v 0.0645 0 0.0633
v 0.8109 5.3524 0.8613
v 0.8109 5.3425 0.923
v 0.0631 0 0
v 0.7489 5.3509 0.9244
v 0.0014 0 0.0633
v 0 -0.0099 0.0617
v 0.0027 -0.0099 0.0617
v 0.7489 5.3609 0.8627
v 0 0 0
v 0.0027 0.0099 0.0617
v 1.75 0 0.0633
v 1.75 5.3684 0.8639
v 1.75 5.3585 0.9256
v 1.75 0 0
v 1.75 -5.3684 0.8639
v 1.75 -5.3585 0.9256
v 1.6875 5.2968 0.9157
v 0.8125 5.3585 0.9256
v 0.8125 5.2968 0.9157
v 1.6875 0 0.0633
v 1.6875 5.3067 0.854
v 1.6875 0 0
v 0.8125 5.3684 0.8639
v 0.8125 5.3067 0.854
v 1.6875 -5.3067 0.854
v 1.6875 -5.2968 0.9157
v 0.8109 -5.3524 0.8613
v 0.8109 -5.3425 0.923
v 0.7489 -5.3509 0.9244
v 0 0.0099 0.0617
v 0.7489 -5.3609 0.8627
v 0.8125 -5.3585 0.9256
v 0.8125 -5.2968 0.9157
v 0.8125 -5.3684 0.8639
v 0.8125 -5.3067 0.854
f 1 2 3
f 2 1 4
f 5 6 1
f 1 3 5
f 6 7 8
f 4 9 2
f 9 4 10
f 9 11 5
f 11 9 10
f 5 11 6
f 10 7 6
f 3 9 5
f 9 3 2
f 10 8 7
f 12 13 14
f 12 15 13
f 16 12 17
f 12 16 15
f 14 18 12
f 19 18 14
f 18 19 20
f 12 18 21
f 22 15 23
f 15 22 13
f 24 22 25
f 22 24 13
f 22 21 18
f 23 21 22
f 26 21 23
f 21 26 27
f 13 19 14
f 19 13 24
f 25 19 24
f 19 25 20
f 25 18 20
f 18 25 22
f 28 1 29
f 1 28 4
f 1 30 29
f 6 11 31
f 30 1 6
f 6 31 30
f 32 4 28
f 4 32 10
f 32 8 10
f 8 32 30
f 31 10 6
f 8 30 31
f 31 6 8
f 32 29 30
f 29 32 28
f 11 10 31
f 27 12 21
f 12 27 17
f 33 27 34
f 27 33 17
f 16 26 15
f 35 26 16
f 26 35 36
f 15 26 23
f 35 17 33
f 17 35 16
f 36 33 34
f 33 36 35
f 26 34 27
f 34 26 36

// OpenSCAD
// file: stab_panel.scad
include <../wart_data.scad>

module stab_panel() {
  le_angle = atan2(0.75,   stab_span/2);
  tip_rib_offset = stab_span/2*tan(le_angle);

  //leading edge
  difference() {
    rotate([0,0,-le_angle])
      translate([0,-0.5,0])
        cube([spar_size, stab_span/2 * 1.1, spar_size]);
    translate([-0.5,-1,-0.5])
      cube([3,1,1]);
    translate([0,stab_span/2,-0.5])
      cube([2,1,1]);
  }

  // trailing edge
  translate([stab_center_chord - spar_size,0,0])
    cube([spar_size, stab_span/2, spar_size]);

  // tip spar
  translate([spar_size+tip_rib_offset, stab_span/2-spar_size,0])
  cube([stab_tip_chord-2 * spar_size,spar_size, spar_size]);
}

stab_panel();
// file: ../wart_data.scad
//######################################
// A6 - class rule constraints

max_wing_area = 30;		// square inches
spar_size = 1/16;
min_rib_thickness = 1/32;
min_rib_height = 1/16;
max_motor_stick_length = 6;
max_prop_diameter = 6;
prop_blade_thickness = 1/32;	// flat
min_weight = 1.2;			        // grams

//##################################################
// paper tubes
pt_t = 1/64;
pt_id = 1/16;
pt_r = 1/32;
pt_h = 0.25;

//######################################
wing_center_chord = 2;
wing_center_span = 8;
wing_tip_chord = 1.75;
wing_tip_span = 3.75;
wing_rib_camber = 4;
wing_tip_dihedral = 7/16;
winglet_chord = 1.75;
winglet_span = 1.25;

//######################################
stab_center_chord = 1.75;
stab_tip_chord = 1;
stab_span = 10 + 14/16;
stab_camber = 2;
stab_tip_dihedral = 7/8;

//######################################
fin_radius = 2;

//######################################
ms_length = max_motor_stick_length;
ms_front_height = 0.160;
ms_height = 0.190;
ms_rear_height = 0.160;
ms_front_post = 1.25;
ms_thickness = 0.070;
wing_post_height = 7/8;

// motor stick polygon
ms_x0 = 0.0;
ms_x1 = ms_length;
ms_x2 = ms_length;
ms_x3 = ms_front_post + wing_center_chord + 2 * (pt_r + pt_t);
ms_x4 = ms_front_post + pt_r + pt_t;
ms_x5 = 0.25;
ms_x6 = 0.0;

ms_y = ms_thickness;

ms_z0 = 0.0;
ms_z1 = 0.0;
ms_z2 = ms_rear_height;
ms_z3 = ms_height;
ms_z4 = ms_height;
ms_z5 = 0.18;
ms_z6 = ms_front_height;

ms_poly = [
    [ms_x0, ms_z0],
    [ms_x1, ms_z1],
    [ms_x2, ms_z2],
    [ms_x3, ms_z3],
    [ms_x4, ms_z4],
    [ms_x5, ms_z5],
    [ms_x6, ms_z6],
];

//######################################
tail_boom_length = 8.5;
tail_boom_front_height = 1/8;
tail_boom_thickness = 1/16;
tail_boom_rear_height = 1/16;
tail_boom_overlap = 0.5;
tail_boom_elevation = ms_rear_height + 3/16;
tb_overlap = 0.25;
// main file
include <../wart_data.scad>

use <./stab_panel.scad>
dihedral_angle = atan2(stab_tip_dihedral,stab_span/2);

module stab() {
	rotate([dihedral_angle,0,0])
    stab_panel();
  rotate([-dihedral_angle,0,0])
    mirror([0,1,0]) 
      stab_panel();
}

stab();
